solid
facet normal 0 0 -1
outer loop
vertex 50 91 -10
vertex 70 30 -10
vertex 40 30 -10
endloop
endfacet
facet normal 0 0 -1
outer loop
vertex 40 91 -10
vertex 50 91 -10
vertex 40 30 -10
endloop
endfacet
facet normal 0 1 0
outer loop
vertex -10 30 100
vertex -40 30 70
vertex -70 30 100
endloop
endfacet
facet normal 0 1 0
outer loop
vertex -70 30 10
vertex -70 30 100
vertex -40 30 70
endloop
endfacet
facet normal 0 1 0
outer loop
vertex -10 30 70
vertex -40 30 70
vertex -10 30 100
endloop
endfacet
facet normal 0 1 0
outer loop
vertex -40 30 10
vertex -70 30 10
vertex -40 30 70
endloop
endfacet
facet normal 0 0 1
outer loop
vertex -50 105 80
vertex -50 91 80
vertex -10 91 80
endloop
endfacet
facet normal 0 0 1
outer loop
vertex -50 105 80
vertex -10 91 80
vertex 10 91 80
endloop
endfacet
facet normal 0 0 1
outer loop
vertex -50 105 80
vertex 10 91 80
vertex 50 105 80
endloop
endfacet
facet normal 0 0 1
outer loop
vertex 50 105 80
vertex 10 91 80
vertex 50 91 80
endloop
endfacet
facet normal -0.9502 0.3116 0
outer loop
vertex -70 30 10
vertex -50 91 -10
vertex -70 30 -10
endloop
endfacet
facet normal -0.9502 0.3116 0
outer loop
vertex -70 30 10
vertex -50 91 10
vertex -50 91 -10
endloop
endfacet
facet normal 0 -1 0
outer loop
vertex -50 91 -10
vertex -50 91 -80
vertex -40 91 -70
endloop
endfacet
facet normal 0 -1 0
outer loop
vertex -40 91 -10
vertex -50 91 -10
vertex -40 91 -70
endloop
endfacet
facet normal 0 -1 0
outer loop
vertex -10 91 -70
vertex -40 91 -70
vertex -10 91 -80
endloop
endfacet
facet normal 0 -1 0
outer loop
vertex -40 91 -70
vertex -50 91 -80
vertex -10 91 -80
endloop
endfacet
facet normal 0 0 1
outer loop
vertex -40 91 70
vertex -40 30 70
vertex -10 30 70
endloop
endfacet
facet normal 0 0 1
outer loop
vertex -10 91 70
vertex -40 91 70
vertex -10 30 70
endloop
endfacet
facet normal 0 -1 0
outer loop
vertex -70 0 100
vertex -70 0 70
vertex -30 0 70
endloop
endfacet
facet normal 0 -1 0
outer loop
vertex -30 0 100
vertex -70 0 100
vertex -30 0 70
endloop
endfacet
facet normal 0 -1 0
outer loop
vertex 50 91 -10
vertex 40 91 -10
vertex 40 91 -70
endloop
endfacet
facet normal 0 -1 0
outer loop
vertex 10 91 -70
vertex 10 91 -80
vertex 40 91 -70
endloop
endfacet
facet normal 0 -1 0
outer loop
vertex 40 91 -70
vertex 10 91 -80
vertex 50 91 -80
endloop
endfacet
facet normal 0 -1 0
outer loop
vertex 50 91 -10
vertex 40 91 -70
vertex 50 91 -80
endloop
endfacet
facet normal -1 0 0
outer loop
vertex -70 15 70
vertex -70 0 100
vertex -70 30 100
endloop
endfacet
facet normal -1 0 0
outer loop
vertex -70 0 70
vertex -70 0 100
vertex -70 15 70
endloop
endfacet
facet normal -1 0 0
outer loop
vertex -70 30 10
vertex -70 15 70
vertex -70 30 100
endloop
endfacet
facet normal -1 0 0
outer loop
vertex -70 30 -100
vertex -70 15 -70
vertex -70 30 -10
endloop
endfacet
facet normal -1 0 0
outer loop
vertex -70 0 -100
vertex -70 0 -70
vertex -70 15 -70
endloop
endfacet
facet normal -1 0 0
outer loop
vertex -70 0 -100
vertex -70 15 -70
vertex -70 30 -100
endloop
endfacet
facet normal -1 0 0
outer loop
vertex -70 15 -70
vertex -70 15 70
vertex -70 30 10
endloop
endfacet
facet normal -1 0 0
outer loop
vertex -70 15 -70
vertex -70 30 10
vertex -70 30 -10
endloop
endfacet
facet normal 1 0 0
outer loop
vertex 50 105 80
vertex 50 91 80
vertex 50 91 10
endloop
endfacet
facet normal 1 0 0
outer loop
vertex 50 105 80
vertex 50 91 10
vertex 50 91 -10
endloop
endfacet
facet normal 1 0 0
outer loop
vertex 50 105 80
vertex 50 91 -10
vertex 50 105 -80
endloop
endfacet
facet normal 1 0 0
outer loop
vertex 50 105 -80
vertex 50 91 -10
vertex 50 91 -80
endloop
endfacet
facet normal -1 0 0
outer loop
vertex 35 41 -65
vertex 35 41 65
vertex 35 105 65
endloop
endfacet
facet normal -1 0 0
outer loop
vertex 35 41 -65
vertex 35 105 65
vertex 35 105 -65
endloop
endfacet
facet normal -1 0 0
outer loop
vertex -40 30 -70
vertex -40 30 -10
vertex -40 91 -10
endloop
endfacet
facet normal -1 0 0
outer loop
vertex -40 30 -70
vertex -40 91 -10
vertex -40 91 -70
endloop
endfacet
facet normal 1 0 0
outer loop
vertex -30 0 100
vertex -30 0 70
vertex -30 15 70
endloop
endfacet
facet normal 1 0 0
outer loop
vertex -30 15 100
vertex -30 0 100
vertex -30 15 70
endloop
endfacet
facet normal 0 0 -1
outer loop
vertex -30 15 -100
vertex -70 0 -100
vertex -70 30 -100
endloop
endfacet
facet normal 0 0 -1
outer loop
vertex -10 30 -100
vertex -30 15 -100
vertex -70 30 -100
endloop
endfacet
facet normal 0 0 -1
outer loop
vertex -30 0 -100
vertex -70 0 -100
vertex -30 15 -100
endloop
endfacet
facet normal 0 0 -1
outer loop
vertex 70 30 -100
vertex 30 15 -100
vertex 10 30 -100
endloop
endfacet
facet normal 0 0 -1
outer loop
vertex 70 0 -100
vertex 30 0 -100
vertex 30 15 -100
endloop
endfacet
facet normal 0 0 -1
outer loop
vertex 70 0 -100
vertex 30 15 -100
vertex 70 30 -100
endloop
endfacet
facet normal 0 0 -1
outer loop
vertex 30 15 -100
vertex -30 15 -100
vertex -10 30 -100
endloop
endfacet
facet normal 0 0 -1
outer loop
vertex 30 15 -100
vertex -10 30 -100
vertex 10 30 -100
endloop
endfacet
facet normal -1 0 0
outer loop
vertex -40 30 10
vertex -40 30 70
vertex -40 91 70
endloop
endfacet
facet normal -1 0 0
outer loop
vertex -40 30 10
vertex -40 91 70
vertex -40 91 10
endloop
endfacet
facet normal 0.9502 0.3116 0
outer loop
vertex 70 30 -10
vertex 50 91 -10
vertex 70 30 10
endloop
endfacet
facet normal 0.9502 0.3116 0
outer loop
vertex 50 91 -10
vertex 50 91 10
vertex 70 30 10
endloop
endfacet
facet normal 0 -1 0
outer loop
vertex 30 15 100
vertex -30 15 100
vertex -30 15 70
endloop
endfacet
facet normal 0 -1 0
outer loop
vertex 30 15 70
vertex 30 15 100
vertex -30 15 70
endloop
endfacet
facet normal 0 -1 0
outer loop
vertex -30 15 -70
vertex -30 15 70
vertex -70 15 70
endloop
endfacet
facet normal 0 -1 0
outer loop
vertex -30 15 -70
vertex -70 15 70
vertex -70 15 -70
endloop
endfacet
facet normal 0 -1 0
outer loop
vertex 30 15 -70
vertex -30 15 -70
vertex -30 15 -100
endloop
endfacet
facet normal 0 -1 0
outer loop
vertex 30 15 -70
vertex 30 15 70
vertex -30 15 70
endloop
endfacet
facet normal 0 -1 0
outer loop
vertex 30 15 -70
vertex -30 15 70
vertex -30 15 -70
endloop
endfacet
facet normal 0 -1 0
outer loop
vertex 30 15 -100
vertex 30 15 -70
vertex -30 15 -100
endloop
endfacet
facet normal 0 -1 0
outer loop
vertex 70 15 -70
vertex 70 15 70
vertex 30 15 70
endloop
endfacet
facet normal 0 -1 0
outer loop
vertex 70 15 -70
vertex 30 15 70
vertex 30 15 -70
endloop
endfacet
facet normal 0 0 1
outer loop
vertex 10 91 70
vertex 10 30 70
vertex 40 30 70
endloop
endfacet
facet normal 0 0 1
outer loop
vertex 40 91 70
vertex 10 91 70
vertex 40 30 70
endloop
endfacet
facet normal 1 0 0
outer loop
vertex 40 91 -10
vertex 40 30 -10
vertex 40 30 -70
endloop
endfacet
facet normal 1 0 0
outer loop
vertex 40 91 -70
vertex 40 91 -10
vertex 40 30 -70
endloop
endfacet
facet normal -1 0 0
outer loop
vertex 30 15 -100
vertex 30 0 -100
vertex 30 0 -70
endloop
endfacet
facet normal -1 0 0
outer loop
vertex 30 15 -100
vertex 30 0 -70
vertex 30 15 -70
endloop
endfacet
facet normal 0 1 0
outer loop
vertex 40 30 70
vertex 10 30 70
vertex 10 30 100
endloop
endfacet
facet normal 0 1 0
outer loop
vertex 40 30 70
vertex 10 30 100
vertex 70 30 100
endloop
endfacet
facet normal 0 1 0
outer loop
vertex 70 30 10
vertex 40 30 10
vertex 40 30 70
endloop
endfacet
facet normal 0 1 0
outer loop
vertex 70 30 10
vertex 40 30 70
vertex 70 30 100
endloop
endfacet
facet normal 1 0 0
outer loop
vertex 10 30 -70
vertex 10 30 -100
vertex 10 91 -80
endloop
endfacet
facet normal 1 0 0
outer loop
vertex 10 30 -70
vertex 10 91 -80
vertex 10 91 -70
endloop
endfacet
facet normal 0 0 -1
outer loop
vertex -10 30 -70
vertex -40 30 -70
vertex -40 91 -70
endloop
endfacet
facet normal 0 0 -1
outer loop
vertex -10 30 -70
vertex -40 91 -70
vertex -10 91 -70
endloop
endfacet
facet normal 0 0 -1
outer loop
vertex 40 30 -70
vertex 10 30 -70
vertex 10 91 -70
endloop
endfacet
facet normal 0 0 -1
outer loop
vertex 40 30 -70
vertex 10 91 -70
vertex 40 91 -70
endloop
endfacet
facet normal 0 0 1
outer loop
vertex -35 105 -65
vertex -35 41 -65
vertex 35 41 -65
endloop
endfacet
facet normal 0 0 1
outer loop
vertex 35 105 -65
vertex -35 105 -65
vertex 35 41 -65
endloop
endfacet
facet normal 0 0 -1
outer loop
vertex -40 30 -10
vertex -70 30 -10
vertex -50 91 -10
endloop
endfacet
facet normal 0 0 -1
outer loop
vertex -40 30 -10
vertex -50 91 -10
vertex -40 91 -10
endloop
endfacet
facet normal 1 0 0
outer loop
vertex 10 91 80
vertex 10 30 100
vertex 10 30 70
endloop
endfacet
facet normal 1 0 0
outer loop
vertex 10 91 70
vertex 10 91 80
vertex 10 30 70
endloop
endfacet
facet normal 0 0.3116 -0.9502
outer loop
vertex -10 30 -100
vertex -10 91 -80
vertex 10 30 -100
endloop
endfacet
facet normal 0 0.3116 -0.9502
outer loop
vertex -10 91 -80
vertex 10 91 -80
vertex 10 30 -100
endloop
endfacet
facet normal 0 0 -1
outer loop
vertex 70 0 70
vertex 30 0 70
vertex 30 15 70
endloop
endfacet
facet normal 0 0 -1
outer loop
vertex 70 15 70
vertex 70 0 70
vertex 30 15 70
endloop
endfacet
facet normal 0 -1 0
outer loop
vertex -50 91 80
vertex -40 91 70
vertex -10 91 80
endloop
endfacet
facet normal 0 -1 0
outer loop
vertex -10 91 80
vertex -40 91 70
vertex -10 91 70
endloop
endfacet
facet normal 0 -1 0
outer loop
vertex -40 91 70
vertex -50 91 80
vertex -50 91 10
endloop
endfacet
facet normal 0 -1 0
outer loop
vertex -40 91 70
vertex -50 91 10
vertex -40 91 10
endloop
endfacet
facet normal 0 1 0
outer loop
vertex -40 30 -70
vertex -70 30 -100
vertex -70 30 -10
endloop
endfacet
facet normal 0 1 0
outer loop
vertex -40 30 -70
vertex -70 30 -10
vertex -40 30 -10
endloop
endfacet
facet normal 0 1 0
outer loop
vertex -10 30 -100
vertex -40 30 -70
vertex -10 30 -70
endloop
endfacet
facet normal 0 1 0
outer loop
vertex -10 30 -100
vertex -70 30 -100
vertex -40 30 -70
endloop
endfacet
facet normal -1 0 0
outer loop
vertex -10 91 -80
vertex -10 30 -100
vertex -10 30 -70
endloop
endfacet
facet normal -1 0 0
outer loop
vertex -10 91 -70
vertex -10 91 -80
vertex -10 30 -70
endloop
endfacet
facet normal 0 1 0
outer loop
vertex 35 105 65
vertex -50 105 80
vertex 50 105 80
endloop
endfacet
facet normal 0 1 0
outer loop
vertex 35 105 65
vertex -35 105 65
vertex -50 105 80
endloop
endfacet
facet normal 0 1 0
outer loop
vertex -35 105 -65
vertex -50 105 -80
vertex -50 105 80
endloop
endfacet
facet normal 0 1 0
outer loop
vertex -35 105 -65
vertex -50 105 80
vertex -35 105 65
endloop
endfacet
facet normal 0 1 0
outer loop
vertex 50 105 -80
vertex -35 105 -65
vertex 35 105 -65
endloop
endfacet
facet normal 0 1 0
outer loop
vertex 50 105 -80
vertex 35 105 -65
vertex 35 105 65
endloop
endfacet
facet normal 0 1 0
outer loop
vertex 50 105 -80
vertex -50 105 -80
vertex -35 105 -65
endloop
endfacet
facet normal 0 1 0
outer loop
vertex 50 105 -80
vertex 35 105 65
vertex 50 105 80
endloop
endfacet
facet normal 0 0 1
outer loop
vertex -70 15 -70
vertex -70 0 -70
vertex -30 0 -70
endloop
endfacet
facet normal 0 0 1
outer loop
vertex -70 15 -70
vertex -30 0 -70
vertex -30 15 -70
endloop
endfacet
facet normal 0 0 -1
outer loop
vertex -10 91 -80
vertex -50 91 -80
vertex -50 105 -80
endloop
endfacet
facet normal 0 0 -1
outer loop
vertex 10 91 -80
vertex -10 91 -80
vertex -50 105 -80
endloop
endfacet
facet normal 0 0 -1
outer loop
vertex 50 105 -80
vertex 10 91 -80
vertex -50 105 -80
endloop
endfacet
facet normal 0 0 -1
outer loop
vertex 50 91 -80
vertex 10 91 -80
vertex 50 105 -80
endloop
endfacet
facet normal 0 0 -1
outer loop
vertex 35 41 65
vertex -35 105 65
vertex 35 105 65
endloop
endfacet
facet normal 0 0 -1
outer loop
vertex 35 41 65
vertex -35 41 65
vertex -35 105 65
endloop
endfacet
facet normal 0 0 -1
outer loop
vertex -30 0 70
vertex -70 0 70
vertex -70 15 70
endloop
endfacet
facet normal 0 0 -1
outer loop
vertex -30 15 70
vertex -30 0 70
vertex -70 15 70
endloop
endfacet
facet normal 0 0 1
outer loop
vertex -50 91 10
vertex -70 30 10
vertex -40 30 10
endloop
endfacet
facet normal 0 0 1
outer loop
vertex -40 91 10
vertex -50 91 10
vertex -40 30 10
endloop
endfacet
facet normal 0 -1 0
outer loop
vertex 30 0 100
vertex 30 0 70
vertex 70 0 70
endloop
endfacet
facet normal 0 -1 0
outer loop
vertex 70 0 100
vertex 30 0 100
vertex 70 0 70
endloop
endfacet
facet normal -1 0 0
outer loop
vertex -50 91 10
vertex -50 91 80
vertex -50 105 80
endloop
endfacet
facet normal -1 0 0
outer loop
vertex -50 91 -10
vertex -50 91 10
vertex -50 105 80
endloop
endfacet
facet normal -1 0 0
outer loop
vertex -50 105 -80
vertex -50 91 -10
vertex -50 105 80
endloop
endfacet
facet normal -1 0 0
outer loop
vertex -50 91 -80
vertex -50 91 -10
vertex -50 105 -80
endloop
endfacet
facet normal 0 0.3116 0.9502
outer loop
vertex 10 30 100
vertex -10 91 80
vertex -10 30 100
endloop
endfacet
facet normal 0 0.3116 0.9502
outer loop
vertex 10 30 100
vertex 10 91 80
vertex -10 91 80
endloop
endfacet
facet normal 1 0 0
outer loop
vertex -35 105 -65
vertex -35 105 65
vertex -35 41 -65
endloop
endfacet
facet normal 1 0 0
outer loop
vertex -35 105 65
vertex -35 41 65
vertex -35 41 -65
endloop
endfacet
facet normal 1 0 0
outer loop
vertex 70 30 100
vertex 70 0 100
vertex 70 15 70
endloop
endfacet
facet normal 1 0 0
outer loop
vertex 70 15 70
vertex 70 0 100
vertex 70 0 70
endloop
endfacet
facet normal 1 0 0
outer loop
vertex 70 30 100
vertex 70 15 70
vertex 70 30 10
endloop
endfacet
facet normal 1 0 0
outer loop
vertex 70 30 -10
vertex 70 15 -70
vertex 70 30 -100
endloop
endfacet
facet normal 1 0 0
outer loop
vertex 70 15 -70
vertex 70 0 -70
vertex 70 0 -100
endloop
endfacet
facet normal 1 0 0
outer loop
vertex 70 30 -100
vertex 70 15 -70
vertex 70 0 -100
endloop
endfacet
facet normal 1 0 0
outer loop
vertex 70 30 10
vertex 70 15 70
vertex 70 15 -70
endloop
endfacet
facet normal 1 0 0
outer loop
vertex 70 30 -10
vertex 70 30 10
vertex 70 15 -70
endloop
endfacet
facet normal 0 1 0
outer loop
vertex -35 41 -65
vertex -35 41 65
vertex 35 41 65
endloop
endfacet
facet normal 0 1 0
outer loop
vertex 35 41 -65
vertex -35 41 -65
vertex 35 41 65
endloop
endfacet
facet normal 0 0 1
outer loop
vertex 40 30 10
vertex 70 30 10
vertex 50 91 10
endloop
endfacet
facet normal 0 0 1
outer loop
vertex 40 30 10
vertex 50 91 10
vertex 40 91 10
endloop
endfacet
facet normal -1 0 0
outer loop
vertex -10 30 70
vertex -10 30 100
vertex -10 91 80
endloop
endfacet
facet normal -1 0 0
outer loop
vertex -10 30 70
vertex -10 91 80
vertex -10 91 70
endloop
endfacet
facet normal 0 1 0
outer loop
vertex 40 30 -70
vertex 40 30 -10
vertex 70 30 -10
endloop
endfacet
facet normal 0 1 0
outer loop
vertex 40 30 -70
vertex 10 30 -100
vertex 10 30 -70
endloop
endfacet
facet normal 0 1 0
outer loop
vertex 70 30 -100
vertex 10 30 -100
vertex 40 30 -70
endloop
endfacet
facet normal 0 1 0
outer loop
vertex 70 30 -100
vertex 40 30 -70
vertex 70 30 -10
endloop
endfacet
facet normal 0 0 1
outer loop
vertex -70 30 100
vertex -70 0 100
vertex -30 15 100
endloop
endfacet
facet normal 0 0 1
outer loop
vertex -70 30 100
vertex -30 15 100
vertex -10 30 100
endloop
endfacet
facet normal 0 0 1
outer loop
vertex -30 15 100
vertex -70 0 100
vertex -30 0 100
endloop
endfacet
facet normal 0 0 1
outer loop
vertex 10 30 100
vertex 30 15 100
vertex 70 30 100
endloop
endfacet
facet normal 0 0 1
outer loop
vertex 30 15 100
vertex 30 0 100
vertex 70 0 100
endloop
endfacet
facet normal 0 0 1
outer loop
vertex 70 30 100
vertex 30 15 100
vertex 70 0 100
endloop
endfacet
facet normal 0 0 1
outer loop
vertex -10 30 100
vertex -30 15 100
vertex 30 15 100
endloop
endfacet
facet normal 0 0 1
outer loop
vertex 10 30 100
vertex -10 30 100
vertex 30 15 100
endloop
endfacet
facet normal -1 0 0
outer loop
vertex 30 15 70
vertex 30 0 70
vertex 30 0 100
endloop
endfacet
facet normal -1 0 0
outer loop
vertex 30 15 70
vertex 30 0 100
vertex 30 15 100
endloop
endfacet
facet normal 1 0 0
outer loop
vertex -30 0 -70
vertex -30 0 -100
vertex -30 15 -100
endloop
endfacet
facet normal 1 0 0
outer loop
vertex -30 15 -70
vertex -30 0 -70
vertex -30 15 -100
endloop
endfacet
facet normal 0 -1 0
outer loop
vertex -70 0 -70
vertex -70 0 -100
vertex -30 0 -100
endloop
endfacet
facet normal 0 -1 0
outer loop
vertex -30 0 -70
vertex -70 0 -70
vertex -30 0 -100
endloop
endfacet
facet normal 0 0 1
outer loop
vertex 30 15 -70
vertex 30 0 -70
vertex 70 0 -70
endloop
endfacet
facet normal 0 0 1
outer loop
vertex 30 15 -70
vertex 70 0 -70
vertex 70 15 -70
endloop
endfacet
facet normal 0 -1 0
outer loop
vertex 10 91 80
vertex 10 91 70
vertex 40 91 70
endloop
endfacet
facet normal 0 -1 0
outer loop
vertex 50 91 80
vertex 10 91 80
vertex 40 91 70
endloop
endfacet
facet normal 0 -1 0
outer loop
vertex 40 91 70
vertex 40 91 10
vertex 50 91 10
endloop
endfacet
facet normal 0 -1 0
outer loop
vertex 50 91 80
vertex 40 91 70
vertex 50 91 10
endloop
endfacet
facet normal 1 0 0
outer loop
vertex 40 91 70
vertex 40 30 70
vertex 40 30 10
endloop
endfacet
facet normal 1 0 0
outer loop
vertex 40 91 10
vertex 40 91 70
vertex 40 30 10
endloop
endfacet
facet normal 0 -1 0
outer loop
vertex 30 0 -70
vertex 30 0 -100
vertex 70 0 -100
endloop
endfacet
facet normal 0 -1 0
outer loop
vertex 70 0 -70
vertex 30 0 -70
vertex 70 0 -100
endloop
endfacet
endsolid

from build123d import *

# Parameters (mm, degrees)
SKETCH2_W           = 140
SKETCH2_H           = 200
BOSS_EXTRUDE1_DEPTH = 30
SKETCH3_W           = 60
SKETCH3_H           = 15
CUT_EXTRUDE1_DEPTH  = 215.00934559
SKETCH4_W           = 140
SKETCH4_H           = 15
CUT_EXTRUDE2_DEPTH  = 175.642491966
SKETCH6_W           = 80
SKETCH6_H           = 140
BOSS_EXTRUDE2_DEPTH = 61
SKETCH12_W          = 100
SKETCH12_H          = 160
SKETCH12_W_2        = 70
SKETCH12_H_2        = 130
BOSS_EXTRUDE3_DEPTH = 14
SKETCH15_W          = 70
SKETCH15_H          = 130
CUT_EXTRUDE3_DEPTH  = 50
BOSS_EXTRUDE4_DEPTH = 10
BOSS_EXTRUDE5_DEPTH = 10


with BuildPart() as part:
    # Sketch2 → Boss-Extrude1 (new body)
    with BuildSketch(Plane(origin=(0, 0, 0), x_dir=(1, 0, 0), z_dir=(0, 1, 0))):
        Rectangle(SKETCH2_W, SKETCH2_H)
    extrude(amount=BOSS_EXTRUDE1_DEPTH)

    # Sketch3 → Cut-Extrude1 (cut, through all)
    with BuildSketch(Plane.XY.offset(100)):
        with Locations((0, 7.5)):
            Rectangle(SKETCH3_W, SKETCH3_H)
    extrude(amount=-CUT_EXTRUDE1_DEPTH, mode=Mode.SUBTRACT)

    # Sketch4 → Cut-Extrude2 (cut, through all)
    with BuildSketch(Plane(origin=(70, 0, 0), x_dir=(0, 0, -1), z_dir=(1, 0, 0))):
        with Locations((0, 7.5)):
            Rectangle(SKETCH4_W, SKETCH4_H)
    extrude(amount=-CUT_EXTRUDE2_DEPTH, mode=Mode.SUBTRACT)

    # Sketch6 → Boss-Extrude2 (add)
    with BuildSketch(Plane(origin=(0, 30, 0), x_dir=(1, 0, 0), z_dir=(0, 1, 0))):
        Rectangle(SKETCH6_W, SKETCH6_H)
    extrude(amount=BOSS_EXTRUDE2_DEPTH)

    # Sketch12 → Boss-Extrude3 (add)
    with BuildSketch(Plane(origin=(0, 91, 0), x_dir=(1, 0, 0), z_dir=(0, 1, 0))):
        Rectangle(SKETCH12_W, SKETCH12_H)
        Rectangle(SKETCH12_W_2, SKETCH12_H_2, mode=Mode.SUBTRACT)
    extrude(amount=BOSS_EXTRUDE3_DEPTH)

    # Sketch15 → Cut-Extrude3 (cut)
    with BuildSketch(Plane(origin=(0, 91, 0), x_dir=(1, 0, 0), z_dir=(0, 1, 0))):
        Rectangle(SKETCH15_W, SKETCH15_H)
    extrude(amount=-CUT_EXTRUDE3_DEPTH, mode=Mode.SUBTRACT)

    # Sketch23 → Boss-Extrude4 (add, symmetric)
    with BuildSketch(Plane.XY):
        Polygon((-50, 91), (-70, 30), (-40, 30), (-40, 91), align=None)
    boss_extrude4 = extrude(amount=BOSS_EXTRUDE4_DEPTH, both=True)

    # Mirror1: Boss-Extrude4 across plane
    add(boss_extrude4.mirror(Plane(origin=(0, 0, 0), x_dir=(0, 0, 1), z_dir=(1, 0, 0))))

    # Sketch24 → Boss-Extrude5 (add, symmetric)
    with BuildSketch(Plane(origin=(0, 0, 0), x_dir=(0, 0, -1), z_dir=(1, 0, 0))):
        Polygon((-80, 91), (-100, 30), (-70, 30), (-70, 91), align=None)
    boss_extrude5 = extrude(amount=BOSS_EXTRUDE5_DEPTH, both=True)

    # Mirror2: Boss-Extrude5 across plane
    add(boss_extrude5.mirror(Plane.XY))


solid = part.part
